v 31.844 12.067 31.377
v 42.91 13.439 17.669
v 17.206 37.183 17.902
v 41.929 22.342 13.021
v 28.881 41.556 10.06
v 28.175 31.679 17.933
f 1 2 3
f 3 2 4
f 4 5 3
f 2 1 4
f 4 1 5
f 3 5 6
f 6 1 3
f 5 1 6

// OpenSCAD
// Auto-generated auxetic polyhedron
points = [
    [17.205652, 37.182740, 17.902098],
    [42.909499, 13.439076, 17.668848],
    [31.843704, 12.066575, 31.377149],
    [41.928761, 22.342461, 13.020647],
    [28.881005, 41.555687, 10.060030],
    [28.174933, 31.679217, 17.933196],
];

faces = [
    [0, 1, 2],
    [3, 1, 0],
    [0, 4, 3],
    [3, 2, 1],
    [4, 2, 3],
    [5, 4, 0],
    [0, 2, 5],
    [5, 2, 4],
];

polyhedron(points = points, faces = faces);
